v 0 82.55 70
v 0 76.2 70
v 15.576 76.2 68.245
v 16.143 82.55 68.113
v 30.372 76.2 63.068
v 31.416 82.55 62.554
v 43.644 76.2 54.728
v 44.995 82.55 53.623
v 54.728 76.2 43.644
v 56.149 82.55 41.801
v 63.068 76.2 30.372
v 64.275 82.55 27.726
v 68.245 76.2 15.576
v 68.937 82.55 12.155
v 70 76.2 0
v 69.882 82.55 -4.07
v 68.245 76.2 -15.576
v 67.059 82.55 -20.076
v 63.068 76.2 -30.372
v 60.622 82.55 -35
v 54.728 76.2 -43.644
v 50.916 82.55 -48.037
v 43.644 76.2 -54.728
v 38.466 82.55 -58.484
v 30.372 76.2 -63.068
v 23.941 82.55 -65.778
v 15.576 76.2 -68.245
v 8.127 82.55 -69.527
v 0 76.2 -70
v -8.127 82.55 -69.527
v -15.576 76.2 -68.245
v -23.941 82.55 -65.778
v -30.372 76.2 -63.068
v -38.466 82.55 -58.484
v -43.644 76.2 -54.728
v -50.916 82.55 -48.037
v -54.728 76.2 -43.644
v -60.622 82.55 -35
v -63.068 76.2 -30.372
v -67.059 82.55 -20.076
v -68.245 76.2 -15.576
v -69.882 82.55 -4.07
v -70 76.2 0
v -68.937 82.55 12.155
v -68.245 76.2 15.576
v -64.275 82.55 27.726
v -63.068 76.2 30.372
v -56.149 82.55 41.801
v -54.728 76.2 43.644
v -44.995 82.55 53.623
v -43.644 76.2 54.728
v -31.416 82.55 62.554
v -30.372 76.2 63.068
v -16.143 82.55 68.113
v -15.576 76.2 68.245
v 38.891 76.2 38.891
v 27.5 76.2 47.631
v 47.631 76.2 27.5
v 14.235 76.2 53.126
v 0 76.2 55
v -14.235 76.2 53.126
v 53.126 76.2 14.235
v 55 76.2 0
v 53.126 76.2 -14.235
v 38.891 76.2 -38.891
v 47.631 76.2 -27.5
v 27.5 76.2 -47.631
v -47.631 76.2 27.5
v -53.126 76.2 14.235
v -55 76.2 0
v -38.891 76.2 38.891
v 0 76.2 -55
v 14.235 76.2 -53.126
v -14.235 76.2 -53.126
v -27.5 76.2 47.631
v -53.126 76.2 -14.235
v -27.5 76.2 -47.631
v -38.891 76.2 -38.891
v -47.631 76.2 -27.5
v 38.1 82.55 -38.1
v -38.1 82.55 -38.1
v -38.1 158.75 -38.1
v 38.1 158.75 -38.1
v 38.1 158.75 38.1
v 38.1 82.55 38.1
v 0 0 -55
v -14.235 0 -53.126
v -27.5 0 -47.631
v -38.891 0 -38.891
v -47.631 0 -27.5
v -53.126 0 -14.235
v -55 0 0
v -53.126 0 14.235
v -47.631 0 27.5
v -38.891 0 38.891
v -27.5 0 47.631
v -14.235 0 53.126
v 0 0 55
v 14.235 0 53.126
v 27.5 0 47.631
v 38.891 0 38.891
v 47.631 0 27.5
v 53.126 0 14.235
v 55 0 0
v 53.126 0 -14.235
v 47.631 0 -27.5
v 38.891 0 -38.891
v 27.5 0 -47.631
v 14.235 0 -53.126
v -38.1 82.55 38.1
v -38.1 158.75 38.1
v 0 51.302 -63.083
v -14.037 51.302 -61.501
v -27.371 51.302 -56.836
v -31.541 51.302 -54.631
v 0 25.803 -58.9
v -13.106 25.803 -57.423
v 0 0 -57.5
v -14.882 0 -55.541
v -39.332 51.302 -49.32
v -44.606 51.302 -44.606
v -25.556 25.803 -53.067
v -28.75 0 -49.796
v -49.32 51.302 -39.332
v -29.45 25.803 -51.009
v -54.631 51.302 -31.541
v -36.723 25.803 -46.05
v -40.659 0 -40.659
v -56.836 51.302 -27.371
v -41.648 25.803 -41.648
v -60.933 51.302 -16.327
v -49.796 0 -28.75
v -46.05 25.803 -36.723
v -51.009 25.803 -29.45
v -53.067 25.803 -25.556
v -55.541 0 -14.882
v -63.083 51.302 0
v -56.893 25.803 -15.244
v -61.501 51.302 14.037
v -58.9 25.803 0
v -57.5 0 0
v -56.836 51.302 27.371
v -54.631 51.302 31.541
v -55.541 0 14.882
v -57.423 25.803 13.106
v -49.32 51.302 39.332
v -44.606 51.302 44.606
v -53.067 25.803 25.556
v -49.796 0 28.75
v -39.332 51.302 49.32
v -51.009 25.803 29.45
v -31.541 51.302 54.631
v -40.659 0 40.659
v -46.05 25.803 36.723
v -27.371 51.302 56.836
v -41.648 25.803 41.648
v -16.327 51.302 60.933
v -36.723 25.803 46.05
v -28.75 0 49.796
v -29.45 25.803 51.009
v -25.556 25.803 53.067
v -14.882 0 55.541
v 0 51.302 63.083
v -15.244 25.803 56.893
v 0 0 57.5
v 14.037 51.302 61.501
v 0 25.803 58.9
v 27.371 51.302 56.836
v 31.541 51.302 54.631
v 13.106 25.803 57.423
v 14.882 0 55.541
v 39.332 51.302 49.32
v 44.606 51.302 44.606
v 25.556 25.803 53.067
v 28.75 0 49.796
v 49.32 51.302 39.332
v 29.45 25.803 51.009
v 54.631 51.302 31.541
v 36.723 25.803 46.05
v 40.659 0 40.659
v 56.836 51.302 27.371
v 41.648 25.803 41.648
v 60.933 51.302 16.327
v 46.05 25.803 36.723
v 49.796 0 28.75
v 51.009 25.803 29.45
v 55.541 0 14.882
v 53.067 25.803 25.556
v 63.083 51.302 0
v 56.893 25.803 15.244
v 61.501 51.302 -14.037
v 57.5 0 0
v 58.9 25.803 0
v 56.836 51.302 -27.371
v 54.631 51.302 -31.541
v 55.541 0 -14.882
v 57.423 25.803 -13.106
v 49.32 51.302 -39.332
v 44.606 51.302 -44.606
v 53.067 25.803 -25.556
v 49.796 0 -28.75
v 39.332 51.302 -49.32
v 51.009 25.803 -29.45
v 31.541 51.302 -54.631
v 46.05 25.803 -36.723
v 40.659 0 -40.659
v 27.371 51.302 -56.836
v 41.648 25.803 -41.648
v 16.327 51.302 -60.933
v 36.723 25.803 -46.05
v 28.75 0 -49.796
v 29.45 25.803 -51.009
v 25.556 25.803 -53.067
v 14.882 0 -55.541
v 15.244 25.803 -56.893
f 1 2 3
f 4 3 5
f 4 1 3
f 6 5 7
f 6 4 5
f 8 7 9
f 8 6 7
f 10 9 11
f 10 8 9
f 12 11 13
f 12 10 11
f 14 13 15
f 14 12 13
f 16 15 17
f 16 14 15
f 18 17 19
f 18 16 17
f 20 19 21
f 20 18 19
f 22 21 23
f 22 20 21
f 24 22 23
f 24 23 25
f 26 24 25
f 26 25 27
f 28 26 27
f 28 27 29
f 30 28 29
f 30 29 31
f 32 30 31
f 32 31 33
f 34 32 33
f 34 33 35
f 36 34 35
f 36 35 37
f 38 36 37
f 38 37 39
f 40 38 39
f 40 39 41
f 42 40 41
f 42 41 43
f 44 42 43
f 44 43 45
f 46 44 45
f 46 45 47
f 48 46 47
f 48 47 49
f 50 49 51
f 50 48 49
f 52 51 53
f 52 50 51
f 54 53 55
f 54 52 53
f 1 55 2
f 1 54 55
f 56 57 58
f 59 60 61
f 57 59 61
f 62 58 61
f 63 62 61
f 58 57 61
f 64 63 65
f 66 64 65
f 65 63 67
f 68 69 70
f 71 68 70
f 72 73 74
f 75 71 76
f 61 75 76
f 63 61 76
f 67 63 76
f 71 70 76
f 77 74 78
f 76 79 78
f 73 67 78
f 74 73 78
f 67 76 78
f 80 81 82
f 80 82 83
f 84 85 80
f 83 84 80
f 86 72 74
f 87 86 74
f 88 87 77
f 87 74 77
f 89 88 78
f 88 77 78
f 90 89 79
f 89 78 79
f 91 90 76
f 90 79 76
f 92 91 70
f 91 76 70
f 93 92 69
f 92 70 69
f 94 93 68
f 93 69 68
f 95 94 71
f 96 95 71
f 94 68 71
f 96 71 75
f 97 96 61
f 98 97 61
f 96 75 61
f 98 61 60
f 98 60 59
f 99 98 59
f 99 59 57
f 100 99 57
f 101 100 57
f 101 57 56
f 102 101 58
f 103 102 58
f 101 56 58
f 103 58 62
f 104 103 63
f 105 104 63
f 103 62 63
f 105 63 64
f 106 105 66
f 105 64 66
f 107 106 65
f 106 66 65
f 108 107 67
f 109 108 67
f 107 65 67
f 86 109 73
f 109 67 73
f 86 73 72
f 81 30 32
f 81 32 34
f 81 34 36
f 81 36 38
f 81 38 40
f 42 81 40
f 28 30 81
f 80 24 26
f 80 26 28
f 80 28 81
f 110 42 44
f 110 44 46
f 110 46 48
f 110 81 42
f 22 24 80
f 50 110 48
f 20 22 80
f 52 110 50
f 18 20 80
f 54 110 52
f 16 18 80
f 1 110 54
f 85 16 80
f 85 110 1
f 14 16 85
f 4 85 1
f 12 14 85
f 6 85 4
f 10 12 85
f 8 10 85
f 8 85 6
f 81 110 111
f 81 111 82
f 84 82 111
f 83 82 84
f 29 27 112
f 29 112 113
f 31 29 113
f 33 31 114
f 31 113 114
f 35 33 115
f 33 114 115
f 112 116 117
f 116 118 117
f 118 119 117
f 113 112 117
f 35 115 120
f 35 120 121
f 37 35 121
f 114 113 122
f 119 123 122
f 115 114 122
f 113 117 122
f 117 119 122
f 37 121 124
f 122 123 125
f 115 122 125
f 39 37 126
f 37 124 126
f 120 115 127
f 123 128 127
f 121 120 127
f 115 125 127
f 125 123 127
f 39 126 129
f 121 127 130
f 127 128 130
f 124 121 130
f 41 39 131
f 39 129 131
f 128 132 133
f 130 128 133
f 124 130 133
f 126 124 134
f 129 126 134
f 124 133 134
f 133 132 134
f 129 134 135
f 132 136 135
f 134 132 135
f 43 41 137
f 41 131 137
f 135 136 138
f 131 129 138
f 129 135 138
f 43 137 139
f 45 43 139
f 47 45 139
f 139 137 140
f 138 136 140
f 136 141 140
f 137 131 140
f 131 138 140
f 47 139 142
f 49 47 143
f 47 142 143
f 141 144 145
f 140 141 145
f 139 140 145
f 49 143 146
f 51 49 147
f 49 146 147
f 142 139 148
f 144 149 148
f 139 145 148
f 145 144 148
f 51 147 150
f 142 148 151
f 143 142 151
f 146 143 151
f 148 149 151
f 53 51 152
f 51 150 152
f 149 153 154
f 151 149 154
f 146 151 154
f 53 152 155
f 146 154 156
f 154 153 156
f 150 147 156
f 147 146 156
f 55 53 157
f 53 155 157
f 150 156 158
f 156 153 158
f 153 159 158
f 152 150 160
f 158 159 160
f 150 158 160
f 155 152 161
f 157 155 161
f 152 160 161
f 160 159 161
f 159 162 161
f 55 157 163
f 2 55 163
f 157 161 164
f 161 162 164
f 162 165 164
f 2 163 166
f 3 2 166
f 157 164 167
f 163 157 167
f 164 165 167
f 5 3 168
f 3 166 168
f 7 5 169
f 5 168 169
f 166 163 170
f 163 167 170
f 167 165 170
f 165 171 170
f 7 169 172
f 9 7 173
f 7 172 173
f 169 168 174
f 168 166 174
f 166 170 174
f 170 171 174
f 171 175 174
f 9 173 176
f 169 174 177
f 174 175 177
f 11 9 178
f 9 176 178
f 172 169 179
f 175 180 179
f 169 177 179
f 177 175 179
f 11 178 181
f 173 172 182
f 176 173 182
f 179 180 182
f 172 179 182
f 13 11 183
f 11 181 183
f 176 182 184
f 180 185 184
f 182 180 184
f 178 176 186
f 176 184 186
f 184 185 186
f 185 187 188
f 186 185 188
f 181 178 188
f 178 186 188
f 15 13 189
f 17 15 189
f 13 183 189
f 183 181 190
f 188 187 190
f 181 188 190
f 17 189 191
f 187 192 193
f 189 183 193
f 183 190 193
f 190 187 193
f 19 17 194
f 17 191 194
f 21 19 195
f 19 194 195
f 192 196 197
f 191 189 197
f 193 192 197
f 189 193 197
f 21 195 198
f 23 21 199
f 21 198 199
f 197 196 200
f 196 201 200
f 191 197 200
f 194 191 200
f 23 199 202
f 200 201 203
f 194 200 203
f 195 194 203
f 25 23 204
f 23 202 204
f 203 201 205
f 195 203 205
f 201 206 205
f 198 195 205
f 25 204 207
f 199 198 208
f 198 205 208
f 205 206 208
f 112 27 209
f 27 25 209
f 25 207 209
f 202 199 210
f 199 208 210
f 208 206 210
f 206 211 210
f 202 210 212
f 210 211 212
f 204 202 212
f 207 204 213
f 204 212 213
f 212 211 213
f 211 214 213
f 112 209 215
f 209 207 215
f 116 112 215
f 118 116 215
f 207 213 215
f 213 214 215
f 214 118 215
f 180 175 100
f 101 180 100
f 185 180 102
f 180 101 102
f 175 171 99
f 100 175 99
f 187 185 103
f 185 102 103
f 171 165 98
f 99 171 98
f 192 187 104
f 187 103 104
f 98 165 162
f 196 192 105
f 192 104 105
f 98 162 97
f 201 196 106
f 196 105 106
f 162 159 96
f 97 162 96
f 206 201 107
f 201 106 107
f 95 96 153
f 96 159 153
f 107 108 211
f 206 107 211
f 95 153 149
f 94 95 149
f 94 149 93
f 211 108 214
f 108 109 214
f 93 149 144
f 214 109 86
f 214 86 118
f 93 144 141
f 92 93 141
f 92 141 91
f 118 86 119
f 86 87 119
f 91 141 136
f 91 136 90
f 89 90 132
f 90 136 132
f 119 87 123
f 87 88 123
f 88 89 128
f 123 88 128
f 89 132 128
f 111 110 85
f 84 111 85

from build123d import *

# Parameters (mm, degrees)
BOSS_EXTRUDE1_START = 6.35
SKETCH2_R           = 70
SKETCH2_R_2         = 55
BOSS_EXTRUDE1_DEPTH = 6.35
SKETCH5_W           = 76.2
SKETCH5_H           = 76.2
BOSS_EXTRUDE3_DEPTH = 76.2


with BuildPart() as part:
    # Sketch1 → Revolve1 (revolve)
    with BuildSketch(Plane.XY, mode=Mode.PRIVATE) as revolve1_sk:
        with BuildLine():
            Line((55, 0), (55, 76.2))
            Line((55, 76.2), (70, 76.2))
            ThreePointArc((70, 76.2), (60.645745066, 38.609228172), (57.5, 0))
            Line((57.5, 0), (55, 0))
        make_face()
    revolve(revolve1_sk.sketch.rotate(Axis((0, 0, 0), (0, 1, 0)), 90), axis=Axis((0, 0, 0), (0, 1, 0)))

    # Sketch2 → Boss-Extrude1 (add)
    # profile 1 of 2: a face of its own
    with BuildSketch(Plane(origin=(0, 76.2, 0), x_dir=(1, 0, 0), z_dir=(0, 1, 0)).offset(BOSS_EXTRUDE1_START)):
        with Locations(Location((0, 0, 0), (0, 0, 270))):
            Circle(SKETCH2_R)
        with Locations(Location((0, 0, 0), (0, 0, 90))):
            Circle(SKETCH2_R_2, mode=Mode.SUBTRACT)
    # profile 2 of 2: a face of its own
    with BuildSketch(Plane(origin=(0, 76.2, 0), x_dir=(1, 0, 0), z_dir=(0, 1, 0)).offset(BOSS_EXTRUDE1_START)):
        with Locations(Location((0, 0, 0), (0, 0, 90))):
            Circle(SKETCH2_R_2)
    extrude(amount=-BOSS_EXTRUDE1_DEPTH)

    # Sketch5 → Boss-Extrude3 (add)
    with BuildSketch(Plane(origin=(0, 82.55, 0), x_dir=(1, 0, 0), z_dir=(0, 1, 0))):
        Rectangle(SKETCH5_W, SKETCH5_H)
    extrude(amount=BOSS_EXTRUDE3_DEPTH)


solid = part.part
